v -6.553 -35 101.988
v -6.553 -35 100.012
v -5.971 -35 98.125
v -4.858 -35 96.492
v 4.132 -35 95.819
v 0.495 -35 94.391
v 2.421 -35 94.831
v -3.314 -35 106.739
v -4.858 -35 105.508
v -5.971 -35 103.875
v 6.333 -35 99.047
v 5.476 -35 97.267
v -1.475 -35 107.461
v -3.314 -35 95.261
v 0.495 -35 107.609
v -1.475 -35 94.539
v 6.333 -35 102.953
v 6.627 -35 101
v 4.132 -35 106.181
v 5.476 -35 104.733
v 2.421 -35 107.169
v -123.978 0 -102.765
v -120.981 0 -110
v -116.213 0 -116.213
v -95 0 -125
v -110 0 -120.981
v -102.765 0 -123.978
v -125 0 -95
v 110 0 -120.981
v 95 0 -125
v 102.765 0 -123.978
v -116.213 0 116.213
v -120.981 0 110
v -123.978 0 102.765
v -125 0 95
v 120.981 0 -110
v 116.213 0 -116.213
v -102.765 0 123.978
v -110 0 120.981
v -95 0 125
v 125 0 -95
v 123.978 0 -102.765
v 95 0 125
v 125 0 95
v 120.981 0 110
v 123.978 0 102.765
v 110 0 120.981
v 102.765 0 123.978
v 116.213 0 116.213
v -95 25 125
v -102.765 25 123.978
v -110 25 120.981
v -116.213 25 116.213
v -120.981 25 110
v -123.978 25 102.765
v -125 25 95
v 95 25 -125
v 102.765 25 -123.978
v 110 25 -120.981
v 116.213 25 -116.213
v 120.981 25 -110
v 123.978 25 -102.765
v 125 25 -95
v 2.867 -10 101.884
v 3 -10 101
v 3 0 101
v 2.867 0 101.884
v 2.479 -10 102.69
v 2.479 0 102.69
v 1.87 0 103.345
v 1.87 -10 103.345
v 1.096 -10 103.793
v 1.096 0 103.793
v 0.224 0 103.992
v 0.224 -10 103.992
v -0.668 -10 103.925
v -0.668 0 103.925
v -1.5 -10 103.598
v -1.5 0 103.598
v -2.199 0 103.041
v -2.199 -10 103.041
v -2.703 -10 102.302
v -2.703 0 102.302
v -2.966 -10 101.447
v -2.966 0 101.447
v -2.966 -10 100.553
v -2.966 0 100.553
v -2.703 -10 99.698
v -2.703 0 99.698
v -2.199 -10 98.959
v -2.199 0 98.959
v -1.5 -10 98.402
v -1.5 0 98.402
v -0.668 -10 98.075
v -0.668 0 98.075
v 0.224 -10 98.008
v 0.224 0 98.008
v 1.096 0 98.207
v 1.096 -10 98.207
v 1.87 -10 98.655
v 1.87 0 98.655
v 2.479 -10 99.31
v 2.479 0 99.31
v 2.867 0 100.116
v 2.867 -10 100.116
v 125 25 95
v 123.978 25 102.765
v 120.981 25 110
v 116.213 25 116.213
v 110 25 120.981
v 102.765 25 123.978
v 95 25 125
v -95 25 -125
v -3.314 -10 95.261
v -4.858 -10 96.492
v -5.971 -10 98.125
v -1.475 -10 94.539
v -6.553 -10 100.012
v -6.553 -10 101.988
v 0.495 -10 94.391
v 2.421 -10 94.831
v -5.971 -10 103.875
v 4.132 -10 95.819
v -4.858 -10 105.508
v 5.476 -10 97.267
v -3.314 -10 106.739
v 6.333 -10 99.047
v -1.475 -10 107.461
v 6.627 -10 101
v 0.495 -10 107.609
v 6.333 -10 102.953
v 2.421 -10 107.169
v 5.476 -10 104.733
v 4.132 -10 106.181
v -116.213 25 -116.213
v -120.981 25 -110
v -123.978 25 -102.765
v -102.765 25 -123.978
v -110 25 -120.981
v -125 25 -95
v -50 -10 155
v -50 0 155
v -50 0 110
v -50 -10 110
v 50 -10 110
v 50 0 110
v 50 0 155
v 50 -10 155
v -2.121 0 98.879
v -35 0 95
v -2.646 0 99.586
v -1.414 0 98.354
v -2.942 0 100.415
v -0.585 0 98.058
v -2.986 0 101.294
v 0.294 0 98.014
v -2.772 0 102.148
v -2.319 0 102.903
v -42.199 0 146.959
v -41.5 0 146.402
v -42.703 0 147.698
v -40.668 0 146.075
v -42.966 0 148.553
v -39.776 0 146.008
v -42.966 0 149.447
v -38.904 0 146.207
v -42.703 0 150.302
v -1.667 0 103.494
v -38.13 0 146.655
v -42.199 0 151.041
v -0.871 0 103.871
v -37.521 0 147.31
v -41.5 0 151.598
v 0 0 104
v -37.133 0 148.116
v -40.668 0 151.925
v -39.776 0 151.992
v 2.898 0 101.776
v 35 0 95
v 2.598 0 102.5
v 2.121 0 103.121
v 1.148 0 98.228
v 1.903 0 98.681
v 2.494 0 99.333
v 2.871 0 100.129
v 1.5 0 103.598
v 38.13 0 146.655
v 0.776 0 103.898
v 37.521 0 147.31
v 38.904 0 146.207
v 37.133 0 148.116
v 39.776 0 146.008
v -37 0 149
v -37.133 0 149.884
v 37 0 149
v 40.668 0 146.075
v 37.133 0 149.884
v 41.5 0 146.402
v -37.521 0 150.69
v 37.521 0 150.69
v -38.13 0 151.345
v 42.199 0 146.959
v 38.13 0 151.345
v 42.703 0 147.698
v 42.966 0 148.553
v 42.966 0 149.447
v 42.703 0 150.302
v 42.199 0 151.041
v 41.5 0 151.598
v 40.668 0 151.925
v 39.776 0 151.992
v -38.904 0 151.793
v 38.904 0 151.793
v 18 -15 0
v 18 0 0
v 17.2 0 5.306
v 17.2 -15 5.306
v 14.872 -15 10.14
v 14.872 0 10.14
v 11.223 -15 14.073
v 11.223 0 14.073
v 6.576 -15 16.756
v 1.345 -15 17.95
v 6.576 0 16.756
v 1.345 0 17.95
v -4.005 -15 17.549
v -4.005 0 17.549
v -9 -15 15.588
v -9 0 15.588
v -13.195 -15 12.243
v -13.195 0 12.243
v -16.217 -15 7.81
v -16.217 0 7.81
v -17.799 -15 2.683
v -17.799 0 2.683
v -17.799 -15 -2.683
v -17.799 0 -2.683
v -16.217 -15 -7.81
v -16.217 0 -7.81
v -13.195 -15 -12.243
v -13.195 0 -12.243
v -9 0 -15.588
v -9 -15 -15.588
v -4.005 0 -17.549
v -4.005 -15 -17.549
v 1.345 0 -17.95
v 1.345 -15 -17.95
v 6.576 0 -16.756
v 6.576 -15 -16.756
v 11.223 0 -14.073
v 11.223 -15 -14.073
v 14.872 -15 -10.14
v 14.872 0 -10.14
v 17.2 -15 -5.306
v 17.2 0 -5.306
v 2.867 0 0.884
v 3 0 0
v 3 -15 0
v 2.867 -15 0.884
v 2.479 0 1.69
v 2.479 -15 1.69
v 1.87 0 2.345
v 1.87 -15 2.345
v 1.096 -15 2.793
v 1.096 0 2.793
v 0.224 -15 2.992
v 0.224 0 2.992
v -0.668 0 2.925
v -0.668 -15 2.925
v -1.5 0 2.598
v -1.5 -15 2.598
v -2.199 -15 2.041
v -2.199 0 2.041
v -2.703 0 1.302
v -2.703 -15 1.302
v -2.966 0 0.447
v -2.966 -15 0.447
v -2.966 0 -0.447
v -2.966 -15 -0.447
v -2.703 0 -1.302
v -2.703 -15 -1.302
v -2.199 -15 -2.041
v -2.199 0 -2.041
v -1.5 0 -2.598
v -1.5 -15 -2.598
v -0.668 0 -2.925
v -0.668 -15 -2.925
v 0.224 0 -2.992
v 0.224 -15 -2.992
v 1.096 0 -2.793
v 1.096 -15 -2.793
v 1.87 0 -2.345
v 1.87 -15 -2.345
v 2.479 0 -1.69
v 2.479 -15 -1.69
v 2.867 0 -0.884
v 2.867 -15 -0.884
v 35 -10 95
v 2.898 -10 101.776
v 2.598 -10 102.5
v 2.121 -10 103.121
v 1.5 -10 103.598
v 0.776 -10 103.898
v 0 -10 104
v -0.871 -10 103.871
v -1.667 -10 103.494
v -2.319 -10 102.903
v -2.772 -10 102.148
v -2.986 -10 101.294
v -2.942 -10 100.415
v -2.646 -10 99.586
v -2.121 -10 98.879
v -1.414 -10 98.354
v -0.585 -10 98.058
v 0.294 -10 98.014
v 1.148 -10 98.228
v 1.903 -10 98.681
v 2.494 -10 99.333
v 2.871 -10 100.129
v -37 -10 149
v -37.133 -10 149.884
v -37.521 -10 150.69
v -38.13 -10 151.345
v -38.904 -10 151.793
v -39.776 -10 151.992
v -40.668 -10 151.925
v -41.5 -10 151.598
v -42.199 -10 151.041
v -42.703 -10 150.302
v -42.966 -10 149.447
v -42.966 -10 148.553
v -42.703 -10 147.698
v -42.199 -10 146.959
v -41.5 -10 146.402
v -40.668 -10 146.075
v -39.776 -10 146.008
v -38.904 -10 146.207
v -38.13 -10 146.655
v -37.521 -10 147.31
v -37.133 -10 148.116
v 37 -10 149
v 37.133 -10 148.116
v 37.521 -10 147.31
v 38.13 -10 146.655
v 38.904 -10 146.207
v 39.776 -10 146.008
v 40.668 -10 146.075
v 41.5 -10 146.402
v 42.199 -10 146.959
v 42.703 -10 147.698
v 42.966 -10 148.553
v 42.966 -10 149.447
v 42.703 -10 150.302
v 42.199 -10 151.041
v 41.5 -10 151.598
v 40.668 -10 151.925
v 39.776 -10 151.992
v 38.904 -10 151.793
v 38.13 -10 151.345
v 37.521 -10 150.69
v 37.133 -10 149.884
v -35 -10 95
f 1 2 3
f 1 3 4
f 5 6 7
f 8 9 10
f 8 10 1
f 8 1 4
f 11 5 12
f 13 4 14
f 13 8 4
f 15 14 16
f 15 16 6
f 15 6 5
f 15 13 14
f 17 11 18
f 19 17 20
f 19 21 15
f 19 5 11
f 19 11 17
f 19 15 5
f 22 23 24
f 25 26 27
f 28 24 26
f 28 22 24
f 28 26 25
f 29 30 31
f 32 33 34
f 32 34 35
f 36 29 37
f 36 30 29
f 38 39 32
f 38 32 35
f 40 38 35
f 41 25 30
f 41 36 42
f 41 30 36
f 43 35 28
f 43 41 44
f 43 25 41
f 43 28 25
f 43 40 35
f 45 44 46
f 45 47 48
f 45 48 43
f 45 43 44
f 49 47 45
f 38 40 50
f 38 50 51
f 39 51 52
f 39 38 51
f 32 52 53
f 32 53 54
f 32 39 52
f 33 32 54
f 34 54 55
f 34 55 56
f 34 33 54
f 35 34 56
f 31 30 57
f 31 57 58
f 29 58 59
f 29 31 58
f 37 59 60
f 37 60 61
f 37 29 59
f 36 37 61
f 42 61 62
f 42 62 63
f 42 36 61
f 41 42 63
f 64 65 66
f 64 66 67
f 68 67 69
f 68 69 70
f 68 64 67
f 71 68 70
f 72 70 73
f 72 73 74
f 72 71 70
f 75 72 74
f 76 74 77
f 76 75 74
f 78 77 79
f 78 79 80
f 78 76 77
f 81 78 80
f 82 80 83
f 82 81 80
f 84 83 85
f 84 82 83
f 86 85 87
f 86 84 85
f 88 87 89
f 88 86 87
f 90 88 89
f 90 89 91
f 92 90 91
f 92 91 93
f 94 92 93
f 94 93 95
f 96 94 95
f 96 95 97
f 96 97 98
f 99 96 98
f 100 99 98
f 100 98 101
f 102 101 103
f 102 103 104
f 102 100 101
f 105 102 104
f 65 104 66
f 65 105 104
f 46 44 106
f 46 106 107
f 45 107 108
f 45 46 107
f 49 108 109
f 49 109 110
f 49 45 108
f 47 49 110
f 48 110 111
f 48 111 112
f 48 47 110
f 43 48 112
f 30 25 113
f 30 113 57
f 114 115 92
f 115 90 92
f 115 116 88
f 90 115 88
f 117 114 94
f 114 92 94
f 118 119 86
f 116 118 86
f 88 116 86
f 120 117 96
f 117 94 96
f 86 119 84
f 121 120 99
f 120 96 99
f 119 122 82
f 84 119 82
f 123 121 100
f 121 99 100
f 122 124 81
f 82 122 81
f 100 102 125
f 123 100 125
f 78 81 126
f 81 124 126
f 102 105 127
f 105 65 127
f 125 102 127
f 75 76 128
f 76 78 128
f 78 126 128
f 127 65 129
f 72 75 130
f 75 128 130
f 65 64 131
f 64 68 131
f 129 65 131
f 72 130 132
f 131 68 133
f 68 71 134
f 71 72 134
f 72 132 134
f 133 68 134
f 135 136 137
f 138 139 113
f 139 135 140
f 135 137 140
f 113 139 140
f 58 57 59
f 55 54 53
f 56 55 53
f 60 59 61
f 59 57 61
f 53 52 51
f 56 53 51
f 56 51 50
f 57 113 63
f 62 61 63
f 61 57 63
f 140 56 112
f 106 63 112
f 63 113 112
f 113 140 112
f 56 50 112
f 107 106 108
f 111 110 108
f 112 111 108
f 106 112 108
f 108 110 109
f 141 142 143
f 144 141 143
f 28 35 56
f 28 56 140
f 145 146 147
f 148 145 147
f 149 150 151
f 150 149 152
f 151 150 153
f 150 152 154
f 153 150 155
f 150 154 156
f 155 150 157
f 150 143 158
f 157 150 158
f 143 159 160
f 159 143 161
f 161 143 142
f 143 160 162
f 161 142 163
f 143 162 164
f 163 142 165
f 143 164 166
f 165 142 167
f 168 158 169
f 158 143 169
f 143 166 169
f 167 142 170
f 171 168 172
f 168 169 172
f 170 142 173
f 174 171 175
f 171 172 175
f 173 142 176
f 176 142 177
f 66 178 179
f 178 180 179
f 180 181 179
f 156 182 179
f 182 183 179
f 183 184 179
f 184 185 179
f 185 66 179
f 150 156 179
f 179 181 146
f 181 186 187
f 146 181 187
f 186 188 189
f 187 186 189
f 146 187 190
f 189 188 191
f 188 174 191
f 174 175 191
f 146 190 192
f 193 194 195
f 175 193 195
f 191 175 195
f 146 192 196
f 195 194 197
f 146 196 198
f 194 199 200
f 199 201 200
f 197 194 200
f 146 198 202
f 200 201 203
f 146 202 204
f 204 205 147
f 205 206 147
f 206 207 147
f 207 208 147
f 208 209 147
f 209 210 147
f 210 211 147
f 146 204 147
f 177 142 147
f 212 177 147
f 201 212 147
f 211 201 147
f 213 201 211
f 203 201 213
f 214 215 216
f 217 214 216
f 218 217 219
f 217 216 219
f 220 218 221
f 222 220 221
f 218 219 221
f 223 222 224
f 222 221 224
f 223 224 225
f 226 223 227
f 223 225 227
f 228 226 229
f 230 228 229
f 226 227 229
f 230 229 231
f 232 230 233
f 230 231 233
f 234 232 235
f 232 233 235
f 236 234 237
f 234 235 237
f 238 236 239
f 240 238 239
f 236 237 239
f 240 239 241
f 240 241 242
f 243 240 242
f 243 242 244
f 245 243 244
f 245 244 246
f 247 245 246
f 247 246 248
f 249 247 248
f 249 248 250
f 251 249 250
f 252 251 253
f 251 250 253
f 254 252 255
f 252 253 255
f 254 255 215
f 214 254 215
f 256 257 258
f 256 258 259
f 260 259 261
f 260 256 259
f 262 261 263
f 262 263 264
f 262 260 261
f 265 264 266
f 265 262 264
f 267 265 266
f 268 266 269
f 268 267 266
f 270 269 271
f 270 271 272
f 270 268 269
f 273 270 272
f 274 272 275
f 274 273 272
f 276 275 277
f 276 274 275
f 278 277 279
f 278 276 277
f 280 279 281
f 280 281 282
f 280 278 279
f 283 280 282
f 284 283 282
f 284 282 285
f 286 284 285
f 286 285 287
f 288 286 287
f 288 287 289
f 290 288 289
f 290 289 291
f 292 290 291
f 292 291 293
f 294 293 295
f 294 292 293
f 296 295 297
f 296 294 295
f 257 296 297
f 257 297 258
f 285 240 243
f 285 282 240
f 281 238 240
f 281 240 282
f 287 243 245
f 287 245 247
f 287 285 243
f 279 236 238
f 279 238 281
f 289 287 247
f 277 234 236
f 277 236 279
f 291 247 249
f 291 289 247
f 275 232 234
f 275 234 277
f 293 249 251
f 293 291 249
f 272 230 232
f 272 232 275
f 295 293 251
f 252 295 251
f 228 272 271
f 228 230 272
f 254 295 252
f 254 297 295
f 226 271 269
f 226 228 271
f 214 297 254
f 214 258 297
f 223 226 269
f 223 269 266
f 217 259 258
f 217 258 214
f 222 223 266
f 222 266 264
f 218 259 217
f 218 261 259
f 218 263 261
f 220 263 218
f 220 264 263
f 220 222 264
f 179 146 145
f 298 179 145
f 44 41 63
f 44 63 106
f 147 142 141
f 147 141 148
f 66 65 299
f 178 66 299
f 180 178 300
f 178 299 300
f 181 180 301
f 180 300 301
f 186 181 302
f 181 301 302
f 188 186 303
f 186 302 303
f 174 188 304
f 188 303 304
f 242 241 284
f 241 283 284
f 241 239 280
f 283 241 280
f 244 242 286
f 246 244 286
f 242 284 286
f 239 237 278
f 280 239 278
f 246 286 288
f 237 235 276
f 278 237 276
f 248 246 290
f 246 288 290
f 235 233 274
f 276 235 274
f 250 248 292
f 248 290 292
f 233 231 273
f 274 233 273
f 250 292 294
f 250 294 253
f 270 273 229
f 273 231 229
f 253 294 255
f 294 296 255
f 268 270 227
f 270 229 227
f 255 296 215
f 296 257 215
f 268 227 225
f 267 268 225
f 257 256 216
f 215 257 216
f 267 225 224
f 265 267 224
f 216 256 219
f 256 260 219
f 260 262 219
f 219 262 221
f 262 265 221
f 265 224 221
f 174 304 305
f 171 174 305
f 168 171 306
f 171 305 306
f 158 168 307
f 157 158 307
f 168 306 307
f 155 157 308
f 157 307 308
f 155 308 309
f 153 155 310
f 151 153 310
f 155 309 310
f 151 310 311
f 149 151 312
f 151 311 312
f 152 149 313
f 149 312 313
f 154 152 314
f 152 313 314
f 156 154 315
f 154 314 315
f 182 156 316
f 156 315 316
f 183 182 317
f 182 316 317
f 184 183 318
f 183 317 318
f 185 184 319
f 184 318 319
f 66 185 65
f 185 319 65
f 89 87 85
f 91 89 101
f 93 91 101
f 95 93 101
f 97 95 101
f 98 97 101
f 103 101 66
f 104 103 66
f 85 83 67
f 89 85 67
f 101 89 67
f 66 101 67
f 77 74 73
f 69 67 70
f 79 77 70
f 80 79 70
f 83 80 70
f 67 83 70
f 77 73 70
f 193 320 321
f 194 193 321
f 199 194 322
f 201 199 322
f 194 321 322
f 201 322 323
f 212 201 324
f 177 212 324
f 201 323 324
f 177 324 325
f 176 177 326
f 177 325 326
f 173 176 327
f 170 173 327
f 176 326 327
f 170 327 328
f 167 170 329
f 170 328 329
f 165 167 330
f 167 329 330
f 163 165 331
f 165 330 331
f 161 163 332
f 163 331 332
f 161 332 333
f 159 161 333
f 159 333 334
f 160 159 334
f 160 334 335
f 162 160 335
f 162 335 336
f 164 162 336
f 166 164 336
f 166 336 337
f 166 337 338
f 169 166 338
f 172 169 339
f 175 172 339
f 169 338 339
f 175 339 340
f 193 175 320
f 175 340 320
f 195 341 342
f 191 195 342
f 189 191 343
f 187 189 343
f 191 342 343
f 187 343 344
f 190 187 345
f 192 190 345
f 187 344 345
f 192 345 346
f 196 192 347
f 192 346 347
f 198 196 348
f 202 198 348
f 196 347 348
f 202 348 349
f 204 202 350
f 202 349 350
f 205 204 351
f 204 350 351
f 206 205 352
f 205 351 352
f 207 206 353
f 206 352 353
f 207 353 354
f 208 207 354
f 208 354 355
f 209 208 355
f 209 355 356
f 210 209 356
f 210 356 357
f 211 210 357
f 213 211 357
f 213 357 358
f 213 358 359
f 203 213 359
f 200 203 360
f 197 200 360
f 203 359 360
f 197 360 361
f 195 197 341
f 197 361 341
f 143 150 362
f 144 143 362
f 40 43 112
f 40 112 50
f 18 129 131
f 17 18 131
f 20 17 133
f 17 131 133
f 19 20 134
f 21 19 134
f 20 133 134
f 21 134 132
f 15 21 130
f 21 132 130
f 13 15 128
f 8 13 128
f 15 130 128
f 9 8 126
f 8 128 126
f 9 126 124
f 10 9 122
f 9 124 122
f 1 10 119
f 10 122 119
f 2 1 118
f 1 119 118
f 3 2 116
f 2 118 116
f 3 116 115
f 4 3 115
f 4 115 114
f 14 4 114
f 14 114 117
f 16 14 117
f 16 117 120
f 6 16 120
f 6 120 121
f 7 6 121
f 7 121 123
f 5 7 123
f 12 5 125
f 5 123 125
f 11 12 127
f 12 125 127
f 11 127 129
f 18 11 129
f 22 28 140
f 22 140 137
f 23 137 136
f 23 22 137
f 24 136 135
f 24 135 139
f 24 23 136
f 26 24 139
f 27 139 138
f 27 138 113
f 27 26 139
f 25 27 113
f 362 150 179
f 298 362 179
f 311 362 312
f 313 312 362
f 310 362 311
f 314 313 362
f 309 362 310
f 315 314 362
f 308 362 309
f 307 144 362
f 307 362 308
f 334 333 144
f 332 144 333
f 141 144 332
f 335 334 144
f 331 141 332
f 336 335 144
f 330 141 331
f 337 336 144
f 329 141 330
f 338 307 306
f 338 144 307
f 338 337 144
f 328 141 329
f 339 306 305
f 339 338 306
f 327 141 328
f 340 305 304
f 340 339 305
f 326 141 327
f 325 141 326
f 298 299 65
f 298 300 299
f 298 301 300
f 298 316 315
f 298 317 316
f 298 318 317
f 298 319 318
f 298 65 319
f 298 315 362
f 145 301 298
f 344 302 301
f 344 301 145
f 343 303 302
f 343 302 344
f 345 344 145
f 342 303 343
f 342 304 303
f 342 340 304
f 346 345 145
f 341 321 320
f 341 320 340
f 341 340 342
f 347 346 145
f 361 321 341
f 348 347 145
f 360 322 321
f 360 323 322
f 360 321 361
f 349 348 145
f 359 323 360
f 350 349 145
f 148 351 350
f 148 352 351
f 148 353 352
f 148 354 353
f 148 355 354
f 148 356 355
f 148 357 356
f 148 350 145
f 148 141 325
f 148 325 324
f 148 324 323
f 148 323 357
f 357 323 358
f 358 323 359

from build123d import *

# Parameters (mm, degrees)
F1_DEPTH   = 25
F2_R       = 18
F2_R_2     = 3
F3_DEPTH   = 15
F4_W       = 100
F4_H       = 30
F5_DEPTH   = 10
F6_R       = 3
F7_DEPTH   = 10
F8_SIZE    = 15
F9_R       = 3
F10_DEPTH  = 10
F9_R_2     = 6.6273474045
F10_FACE_R = 3
F11_DEPTH  = 25


with BuildPart() as f1:
    # F0 (on Front) → F1 (new body)
    with BuildSketch(Plane.XZ):
        with BuildLine():
            ThreePointArc((125, 95), (116.2132034356, 116.2132034356), (95, 125))
            Line((95, 125), (-95, 125))
            ThreePointArc((-95, 125), (-116.2132034356, 116.2132034356), (-125, 95))
            Line((-125, 95), (-125, -95))
            ThreePointArc((-125, -95), (-116.2132034356, -116.2132034356), (-95, -125))
            Line((-95, -125), (95, -125))
            ThreePointArc((95, -125), (116.2132034356, -116.2132034356), (125, -95))
            Line((125, -95), (125, 95))
        make_face()
    extrude(amount=-F1_DEPTH)


with BuildPart() as f3:
    # F2 (on face) → F3 (new body)
    with BuildSketch(Plane.XZ):
        Circle(F2_R)
        Circle(F2_R_2, mode=Mode.SUBTRACT)
    extrude(amount=F3_DEPTH)


with BuildPart() as f5:
    # F4 (on face) → F5 (new body)
    with BuildSketch(Plane.XZ):
        with Locations((0, 140)):
            Rectangle(F4_W, F4_H)
        with Locations((0, 110)):
            Rectangle(F4_W, F4_H)
    extrude(amount=F5_DEPTH)

    # F6 (on face) → F7 (cut, through all)
    with BuildSketch(Plane.XZ.offset(10)):
        with Locations((-40, 149)):
            Circle(F6_R)
        with BuildLine():
            ThreePointArc((3, 101), (2.1213203436, 103.1213203436), (0, 104))
            ThreePointArc((0, 104), (-2.1213203436, 98.8786796564), (3, 101))
        make_face()
        with BuildLine():
            ThreePointArc((43, 149), (40, 152), (37, 149))
            ThreePointArc((37, 149), (40, 146), (43, 149))
        make_face()
    extrude(amount=-F7_DEPTH, mode=Mode.SUBTRACT)

    # F8
    f8_edges = [f5.edges().sort_by_distance(p)[0] for p in [
        (50, -5, 95),
        (-50, -5, 95),
    ]]
    chamfer(f8_edges, length=F8_SIZE)


with BuildPart() as f10:
    # F9 (on face) → F10 (new body)
    with BuildSketch(Plane.XZ.offset(10)):
        with Locations((0, 101)):
            Circle(F9_R)
    extrude(amount=-F10_DEPTH)


with BuildPart() as f11:
    # F9 (on face) + F10_face (on face) → F11 (new body)
    with BuildSketch(Plane.XZ.offset(10)):
        with Locations((0, 101)):
            Circle(F9_R_2)
        with Locations((0, 101)):
            Circle(F9_R, mode=Mode.SUBTRACT)
    with BuildSketch(Plane(origin=(0, -10, 101), x_dir=(1, 0, 0), z_dir=(0, -1, 0))):
        Circle(F10_FACE_R)
    extrude(amount=F11_DEPTH)


with BuildPart() as f10_1:
    add(f10.part)

    # F12: union F11
    add(f11.part)


solid = Compound([f1.part, f3.part, f5.part, f10_1.part])
